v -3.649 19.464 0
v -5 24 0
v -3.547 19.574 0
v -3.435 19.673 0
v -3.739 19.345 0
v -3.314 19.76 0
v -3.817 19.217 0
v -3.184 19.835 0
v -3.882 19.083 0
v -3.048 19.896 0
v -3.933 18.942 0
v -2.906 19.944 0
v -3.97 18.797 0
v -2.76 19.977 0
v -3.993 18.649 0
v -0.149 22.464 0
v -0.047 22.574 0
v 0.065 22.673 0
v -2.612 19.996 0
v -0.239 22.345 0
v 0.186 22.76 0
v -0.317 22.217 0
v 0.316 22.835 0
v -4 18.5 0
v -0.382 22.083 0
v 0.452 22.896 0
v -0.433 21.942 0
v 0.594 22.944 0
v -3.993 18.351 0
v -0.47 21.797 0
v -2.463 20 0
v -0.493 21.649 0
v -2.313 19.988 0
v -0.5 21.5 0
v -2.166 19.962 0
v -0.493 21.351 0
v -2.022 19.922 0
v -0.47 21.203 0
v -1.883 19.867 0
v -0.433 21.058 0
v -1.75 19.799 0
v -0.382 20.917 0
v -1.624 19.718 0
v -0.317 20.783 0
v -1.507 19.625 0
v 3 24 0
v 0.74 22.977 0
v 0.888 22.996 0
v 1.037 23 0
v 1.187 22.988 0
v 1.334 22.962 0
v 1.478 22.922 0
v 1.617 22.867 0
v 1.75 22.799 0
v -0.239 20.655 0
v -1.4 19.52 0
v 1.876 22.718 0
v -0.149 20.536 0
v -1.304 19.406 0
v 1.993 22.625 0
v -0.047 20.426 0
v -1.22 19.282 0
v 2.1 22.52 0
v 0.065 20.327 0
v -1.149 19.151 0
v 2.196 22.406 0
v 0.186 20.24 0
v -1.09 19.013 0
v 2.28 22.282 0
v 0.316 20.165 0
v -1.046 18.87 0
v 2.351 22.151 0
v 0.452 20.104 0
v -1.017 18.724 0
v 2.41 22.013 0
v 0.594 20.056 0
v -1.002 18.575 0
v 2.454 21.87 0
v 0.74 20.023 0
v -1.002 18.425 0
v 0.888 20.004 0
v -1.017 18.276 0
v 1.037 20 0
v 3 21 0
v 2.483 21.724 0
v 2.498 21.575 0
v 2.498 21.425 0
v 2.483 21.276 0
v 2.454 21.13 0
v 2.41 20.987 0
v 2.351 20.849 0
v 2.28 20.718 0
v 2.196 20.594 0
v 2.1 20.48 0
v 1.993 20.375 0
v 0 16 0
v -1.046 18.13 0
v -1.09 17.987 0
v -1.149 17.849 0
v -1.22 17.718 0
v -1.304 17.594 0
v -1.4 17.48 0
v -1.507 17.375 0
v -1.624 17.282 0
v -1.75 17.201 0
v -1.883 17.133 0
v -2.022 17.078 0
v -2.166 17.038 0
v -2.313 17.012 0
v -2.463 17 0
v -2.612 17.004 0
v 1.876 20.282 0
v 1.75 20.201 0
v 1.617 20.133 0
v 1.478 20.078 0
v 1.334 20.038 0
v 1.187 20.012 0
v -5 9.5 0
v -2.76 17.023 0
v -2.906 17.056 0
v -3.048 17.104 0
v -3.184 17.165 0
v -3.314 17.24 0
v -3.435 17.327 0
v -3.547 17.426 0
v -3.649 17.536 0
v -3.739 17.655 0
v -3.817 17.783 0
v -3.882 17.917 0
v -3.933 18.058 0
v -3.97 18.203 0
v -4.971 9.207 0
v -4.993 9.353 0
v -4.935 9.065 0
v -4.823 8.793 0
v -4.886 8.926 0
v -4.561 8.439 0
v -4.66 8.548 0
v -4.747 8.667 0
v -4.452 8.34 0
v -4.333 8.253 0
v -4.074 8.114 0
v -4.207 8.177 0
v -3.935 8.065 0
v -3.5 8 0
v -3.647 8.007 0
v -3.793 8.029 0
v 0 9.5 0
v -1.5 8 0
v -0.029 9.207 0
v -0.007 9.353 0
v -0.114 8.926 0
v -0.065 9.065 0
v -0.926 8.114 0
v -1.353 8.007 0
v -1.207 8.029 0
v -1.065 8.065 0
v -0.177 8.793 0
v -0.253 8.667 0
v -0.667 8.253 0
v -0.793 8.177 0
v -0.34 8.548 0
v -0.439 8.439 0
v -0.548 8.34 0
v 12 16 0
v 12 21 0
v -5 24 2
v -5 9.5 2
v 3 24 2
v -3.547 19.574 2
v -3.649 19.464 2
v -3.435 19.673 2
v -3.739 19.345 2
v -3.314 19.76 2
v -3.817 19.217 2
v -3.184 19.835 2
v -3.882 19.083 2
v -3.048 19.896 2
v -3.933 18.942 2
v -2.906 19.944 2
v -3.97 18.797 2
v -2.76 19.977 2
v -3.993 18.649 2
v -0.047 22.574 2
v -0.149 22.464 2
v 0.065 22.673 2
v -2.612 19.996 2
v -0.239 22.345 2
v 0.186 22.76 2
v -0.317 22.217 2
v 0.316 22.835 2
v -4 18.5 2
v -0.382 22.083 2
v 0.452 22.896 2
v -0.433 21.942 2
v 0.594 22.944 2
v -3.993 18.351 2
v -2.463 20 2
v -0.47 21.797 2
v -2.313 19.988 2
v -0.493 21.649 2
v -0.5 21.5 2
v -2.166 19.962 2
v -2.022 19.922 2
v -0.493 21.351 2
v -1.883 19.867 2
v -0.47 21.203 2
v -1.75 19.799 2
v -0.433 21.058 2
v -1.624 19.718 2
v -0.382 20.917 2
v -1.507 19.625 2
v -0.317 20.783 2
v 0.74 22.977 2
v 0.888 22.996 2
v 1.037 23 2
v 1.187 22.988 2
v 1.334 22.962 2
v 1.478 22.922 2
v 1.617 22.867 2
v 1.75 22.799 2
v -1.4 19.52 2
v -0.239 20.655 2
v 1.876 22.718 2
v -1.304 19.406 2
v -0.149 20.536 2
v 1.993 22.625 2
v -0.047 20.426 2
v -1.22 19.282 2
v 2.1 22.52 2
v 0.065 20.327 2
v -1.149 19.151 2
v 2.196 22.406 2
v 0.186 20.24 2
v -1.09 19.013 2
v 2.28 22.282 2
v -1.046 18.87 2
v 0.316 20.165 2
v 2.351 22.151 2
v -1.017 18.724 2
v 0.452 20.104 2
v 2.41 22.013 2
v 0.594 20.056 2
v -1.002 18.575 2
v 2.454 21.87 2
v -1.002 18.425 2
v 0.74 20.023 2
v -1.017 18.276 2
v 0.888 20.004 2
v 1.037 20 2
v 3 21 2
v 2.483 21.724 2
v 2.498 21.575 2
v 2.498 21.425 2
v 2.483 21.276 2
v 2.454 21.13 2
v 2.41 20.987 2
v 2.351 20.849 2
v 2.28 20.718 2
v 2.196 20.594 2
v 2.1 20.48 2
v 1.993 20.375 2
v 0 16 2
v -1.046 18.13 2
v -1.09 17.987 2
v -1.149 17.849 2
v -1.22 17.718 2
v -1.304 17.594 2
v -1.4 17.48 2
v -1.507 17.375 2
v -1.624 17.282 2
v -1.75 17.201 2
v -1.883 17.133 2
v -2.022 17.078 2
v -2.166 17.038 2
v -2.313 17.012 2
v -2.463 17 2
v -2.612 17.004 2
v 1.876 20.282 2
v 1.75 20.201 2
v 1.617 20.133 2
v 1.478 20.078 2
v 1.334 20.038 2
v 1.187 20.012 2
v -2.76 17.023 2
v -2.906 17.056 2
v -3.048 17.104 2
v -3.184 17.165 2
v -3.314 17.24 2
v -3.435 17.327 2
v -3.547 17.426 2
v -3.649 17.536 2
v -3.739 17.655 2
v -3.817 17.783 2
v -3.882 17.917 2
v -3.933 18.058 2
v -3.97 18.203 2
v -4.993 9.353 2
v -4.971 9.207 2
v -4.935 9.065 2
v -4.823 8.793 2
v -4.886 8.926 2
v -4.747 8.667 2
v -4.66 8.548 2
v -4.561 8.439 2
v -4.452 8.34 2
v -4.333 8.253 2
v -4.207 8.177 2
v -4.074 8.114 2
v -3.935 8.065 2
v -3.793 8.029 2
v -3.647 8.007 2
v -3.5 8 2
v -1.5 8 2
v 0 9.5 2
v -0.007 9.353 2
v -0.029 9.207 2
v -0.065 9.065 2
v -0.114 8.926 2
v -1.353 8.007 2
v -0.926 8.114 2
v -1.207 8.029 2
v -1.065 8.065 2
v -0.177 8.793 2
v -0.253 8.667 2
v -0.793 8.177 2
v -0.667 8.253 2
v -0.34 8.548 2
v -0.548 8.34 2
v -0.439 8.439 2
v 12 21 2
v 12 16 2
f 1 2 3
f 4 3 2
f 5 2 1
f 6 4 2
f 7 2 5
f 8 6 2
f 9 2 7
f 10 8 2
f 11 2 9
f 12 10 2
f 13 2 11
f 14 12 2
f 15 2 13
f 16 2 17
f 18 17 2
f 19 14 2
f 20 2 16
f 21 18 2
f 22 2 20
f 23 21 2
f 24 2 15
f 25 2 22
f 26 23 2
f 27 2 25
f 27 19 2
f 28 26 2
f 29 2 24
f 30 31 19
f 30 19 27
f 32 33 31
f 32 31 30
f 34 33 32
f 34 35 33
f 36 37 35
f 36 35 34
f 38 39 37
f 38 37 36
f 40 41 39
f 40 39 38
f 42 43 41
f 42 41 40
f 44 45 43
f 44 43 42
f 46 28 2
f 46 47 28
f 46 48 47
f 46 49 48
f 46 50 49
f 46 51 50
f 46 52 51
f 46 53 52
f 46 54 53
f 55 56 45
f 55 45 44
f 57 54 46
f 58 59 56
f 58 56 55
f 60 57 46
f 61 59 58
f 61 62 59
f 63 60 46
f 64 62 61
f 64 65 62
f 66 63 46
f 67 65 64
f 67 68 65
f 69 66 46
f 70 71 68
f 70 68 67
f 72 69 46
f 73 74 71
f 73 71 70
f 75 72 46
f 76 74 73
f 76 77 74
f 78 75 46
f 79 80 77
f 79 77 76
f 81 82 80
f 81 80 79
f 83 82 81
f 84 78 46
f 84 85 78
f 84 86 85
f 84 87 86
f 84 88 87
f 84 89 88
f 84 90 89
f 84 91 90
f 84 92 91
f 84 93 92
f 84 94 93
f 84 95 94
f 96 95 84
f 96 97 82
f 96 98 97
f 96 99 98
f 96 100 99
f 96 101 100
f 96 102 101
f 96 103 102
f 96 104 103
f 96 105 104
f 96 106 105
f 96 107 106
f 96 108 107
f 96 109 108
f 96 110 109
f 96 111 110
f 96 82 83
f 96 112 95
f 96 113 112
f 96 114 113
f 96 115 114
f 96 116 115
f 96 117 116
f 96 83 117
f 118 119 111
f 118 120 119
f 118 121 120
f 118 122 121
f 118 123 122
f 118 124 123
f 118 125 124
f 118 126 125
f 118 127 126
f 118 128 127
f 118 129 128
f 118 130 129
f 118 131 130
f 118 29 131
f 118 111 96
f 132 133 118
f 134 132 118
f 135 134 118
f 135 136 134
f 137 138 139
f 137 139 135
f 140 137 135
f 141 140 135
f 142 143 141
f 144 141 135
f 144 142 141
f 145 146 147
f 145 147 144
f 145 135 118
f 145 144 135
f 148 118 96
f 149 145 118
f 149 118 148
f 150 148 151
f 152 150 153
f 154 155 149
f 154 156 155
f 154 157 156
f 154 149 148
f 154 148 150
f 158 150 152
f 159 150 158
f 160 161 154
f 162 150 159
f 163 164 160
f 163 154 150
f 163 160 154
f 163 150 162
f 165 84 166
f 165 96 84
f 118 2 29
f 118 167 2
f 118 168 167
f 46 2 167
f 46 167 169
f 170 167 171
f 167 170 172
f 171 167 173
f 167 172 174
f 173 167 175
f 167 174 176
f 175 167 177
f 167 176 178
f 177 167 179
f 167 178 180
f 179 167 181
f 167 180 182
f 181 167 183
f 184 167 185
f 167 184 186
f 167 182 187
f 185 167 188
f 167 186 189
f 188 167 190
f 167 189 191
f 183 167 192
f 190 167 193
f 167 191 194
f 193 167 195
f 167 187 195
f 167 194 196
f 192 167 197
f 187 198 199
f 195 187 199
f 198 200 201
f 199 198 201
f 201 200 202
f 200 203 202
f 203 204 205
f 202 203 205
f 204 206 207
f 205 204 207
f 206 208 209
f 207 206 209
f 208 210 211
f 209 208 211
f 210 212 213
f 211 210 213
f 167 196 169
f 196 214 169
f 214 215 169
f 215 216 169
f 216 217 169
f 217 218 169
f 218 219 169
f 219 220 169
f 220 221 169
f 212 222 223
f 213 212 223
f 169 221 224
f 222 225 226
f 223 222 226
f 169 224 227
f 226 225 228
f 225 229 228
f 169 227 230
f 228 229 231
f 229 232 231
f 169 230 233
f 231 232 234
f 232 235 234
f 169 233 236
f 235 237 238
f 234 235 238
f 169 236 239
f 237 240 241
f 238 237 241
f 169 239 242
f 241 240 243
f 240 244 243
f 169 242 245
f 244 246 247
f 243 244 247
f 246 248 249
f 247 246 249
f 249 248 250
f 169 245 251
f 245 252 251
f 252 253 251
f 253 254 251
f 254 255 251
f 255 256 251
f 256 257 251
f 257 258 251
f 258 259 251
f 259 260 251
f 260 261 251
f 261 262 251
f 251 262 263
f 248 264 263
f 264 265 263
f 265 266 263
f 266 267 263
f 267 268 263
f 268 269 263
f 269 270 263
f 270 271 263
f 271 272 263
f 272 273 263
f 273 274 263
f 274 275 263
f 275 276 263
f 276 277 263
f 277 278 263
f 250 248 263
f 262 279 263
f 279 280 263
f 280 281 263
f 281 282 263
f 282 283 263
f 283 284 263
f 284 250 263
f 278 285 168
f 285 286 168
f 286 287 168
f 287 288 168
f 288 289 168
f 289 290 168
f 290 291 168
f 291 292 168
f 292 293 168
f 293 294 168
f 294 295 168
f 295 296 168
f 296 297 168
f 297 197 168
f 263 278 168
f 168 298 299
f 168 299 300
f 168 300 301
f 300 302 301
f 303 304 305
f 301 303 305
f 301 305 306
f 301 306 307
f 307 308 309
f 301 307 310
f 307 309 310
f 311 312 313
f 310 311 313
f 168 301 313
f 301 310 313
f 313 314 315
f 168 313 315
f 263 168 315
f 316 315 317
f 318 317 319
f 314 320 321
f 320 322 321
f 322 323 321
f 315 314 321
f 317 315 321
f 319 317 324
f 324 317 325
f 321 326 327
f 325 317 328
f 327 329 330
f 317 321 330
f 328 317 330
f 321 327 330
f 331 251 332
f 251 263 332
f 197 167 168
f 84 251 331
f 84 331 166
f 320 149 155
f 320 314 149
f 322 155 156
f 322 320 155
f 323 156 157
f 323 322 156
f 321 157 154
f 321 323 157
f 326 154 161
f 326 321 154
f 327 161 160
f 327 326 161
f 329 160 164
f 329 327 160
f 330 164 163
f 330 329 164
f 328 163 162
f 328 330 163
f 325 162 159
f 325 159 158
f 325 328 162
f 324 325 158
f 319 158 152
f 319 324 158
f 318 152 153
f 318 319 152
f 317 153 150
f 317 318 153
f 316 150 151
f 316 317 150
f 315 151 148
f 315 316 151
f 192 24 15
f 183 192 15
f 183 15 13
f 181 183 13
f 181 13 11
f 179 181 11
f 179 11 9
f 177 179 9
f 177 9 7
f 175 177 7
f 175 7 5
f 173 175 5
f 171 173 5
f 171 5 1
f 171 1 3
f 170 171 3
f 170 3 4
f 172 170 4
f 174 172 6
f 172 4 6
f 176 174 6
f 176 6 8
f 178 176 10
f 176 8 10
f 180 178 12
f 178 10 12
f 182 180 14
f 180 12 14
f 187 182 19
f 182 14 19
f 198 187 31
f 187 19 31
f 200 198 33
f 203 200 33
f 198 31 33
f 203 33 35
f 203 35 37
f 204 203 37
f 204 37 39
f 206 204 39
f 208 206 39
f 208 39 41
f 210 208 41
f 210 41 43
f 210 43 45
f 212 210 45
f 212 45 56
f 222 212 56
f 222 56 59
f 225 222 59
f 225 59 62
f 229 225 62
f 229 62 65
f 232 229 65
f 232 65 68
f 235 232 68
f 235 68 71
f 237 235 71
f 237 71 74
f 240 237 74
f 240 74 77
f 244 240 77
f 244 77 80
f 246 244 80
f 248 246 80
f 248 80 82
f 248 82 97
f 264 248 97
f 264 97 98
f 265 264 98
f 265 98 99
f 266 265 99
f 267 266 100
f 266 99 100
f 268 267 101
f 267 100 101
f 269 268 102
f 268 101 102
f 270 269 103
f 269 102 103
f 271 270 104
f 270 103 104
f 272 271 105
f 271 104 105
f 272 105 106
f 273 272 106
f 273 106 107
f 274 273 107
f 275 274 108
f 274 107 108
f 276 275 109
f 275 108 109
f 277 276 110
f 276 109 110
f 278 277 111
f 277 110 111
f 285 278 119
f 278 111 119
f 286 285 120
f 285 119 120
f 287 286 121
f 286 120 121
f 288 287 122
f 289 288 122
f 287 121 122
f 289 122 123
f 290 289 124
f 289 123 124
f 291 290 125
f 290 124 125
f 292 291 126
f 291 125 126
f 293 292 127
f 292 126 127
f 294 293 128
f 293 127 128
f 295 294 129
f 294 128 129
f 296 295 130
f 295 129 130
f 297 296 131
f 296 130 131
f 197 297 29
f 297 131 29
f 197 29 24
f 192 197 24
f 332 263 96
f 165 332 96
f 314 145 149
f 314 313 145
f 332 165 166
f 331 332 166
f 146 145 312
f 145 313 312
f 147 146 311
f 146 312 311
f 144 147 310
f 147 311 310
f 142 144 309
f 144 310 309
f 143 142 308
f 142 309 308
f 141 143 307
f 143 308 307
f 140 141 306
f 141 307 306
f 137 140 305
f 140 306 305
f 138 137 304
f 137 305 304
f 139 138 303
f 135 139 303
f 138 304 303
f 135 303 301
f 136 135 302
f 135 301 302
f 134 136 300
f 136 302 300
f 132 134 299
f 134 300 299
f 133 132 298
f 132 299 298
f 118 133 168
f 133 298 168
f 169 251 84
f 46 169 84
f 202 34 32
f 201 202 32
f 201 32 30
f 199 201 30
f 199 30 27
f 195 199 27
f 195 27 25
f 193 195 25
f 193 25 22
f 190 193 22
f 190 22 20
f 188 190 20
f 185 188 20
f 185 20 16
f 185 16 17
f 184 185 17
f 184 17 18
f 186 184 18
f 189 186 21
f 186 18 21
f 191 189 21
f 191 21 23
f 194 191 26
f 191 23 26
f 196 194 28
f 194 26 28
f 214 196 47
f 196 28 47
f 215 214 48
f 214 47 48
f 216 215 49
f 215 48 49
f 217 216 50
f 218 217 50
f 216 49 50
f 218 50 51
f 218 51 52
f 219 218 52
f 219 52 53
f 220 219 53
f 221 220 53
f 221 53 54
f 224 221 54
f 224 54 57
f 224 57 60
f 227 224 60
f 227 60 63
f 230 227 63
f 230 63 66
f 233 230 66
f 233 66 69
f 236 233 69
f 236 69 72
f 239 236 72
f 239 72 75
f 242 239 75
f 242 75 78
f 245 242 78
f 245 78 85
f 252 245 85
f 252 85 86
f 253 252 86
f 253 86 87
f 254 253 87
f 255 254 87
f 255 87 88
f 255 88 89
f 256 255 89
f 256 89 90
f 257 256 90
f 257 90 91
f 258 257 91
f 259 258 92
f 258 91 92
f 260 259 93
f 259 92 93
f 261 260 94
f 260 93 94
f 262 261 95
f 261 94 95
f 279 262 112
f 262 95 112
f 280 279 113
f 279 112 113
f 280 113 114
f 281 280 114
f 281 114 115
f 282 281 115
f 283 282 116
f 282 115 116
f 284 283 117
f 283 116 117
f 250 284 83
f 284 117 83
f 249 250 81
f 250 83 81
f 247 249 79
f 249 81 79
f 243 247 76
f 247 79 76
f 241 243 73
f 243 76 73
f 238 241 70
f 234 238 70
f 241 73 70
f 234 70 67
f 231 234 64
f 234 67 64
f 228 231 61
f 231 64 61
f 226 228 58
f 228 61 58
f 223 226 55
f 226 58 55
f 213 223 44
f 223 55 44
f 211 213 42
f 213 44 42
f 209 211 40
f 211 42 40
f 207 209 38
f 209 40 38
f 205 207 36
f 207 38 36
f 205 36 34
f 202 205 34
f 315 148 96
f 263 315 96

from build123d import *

# Parameters (mm, degrees)
SKETCH_6_W          = 5
SKETCH_6_H          = 21
EXTRUDE_1_DEPTH     = 2
SKETCH_10_W         = 2
SKETCH_10_H         = 5
EXTRUDE_3_DEPTH     = 20
SKETCH_11_W         = 8
SKETCH_11_H         = 5
CUT_EXTRUDE_3_DEPTH = 20
SKETCH_12_R         = 1.5
CUT_EXTRUDE_4_DEPTH = 20
SKETCH_13_W         = 5
SKETCH_13_H         = 2
CUT_EXTRUDE_5_DEPTH = 8
FILLET_1_R          = 1.5
SKETCH_19_W         = 8
SKETCH_19_H         = 2
EXTRUDE_6_DEPTH     = 3
SKETCH_20_R         = 1.5
CUT_EXTRUDE_7_DEPTH = 5


with BuildPart() as part:
    # 草图6 → 凸台-拉伸1 (new body)
    with BuildSketch(Plane.XY):
        with Locations((-2.5, 10.5)):
            Rectangle(SKETCH_6_W, SKETCH_6_H)
    extrude(amount=EXTRUDE_1_DEPTH)

    # 草图10 → 凸台-拉伸3 (add)
    with BuildSketch(Plane(origin=(0, 0, 0), x_dir=(0, 0, -1), z_dir=(1, 0, 0))):
        with Locations((-1, 18.5)):
            Rectangle(SKETCH_10_W, SKETCH_10_H)
    extrude(amount=EXTRUDE_3_DEPTH)

    # 草图11 → 切除-拉伸3 (cut)
    with BuildSketch(Plane(origin=(0, 0, 0), x_dir=(-1, 0, 0), z_dir=(0, 0, -1))):
        with Locations((-16, 18.5)):
            Rectangle(SKETCH_11_W, SKETCH_11_H)
    extrude(amount=-CUT_EXTRUDE_3_DEPTH, mode=Mode.SUBTRACT)

    # 草图12 → 切除-拉伸4 (cut)
    with BuildSketch(Plane(origin=(0, 0, 0), x_dir=(-1, 0, 0), z_dir=(0, 0, -1))):
        with Locations((2.5, 18.5)):
            Circle(SKETCH_12_R)
    extrude(amount=-CUT_EXTRUDE_4_DEPTH, mode=Mode.SUBTRACT)

    # 草图13 → 切除-拉伸5 (cut)
    with BuildSketch(Plane.XZ):
        with Locations((-2.5, 1)):
            Rectangle(SKETCH_13_W, SKETCH_13_H)
    extrude(amount=-CUT_EXTRUDE_5_DEPTH, mode=Mode.SUBTRACT)

    # 圆角1
    fillet_1_edges = [part.edges().sort_by_distance(p)[0] for p in [
        (0, 8, 1),
        (-5, 8, 1),
    ]]
    fillet(fillet_1_edges, radius=FILLET_1_R)

    # 草图19 → 凸台-拉伸6 (add)
    with BuildSketch(Plane(origin=(0, 21, 0), x_dir=(1, 0, 0), z_dir=(0, 1, 0))):
        with Locations((-1, -1)):
            Rectangle(SKETCH_19_W, SKETCH_19_H)
    extrude(amount=EXTRUDE_6_DEPTH)

    # 草图20 → 切除-拉伸7 (cut)
    with BuildSketch(Plane(origin=(0, 0, 0), x_dir=(-1, 0, 0), z_dir=(0, 0, -1))):
        with Locations((-1, 21.5)):
            Circle(SKETCH_20_R)
    extrude(amount=-CUT_EXTRUDE_7_DEPTH, mode=Mode.SUBTRACT)


solid = part.part
